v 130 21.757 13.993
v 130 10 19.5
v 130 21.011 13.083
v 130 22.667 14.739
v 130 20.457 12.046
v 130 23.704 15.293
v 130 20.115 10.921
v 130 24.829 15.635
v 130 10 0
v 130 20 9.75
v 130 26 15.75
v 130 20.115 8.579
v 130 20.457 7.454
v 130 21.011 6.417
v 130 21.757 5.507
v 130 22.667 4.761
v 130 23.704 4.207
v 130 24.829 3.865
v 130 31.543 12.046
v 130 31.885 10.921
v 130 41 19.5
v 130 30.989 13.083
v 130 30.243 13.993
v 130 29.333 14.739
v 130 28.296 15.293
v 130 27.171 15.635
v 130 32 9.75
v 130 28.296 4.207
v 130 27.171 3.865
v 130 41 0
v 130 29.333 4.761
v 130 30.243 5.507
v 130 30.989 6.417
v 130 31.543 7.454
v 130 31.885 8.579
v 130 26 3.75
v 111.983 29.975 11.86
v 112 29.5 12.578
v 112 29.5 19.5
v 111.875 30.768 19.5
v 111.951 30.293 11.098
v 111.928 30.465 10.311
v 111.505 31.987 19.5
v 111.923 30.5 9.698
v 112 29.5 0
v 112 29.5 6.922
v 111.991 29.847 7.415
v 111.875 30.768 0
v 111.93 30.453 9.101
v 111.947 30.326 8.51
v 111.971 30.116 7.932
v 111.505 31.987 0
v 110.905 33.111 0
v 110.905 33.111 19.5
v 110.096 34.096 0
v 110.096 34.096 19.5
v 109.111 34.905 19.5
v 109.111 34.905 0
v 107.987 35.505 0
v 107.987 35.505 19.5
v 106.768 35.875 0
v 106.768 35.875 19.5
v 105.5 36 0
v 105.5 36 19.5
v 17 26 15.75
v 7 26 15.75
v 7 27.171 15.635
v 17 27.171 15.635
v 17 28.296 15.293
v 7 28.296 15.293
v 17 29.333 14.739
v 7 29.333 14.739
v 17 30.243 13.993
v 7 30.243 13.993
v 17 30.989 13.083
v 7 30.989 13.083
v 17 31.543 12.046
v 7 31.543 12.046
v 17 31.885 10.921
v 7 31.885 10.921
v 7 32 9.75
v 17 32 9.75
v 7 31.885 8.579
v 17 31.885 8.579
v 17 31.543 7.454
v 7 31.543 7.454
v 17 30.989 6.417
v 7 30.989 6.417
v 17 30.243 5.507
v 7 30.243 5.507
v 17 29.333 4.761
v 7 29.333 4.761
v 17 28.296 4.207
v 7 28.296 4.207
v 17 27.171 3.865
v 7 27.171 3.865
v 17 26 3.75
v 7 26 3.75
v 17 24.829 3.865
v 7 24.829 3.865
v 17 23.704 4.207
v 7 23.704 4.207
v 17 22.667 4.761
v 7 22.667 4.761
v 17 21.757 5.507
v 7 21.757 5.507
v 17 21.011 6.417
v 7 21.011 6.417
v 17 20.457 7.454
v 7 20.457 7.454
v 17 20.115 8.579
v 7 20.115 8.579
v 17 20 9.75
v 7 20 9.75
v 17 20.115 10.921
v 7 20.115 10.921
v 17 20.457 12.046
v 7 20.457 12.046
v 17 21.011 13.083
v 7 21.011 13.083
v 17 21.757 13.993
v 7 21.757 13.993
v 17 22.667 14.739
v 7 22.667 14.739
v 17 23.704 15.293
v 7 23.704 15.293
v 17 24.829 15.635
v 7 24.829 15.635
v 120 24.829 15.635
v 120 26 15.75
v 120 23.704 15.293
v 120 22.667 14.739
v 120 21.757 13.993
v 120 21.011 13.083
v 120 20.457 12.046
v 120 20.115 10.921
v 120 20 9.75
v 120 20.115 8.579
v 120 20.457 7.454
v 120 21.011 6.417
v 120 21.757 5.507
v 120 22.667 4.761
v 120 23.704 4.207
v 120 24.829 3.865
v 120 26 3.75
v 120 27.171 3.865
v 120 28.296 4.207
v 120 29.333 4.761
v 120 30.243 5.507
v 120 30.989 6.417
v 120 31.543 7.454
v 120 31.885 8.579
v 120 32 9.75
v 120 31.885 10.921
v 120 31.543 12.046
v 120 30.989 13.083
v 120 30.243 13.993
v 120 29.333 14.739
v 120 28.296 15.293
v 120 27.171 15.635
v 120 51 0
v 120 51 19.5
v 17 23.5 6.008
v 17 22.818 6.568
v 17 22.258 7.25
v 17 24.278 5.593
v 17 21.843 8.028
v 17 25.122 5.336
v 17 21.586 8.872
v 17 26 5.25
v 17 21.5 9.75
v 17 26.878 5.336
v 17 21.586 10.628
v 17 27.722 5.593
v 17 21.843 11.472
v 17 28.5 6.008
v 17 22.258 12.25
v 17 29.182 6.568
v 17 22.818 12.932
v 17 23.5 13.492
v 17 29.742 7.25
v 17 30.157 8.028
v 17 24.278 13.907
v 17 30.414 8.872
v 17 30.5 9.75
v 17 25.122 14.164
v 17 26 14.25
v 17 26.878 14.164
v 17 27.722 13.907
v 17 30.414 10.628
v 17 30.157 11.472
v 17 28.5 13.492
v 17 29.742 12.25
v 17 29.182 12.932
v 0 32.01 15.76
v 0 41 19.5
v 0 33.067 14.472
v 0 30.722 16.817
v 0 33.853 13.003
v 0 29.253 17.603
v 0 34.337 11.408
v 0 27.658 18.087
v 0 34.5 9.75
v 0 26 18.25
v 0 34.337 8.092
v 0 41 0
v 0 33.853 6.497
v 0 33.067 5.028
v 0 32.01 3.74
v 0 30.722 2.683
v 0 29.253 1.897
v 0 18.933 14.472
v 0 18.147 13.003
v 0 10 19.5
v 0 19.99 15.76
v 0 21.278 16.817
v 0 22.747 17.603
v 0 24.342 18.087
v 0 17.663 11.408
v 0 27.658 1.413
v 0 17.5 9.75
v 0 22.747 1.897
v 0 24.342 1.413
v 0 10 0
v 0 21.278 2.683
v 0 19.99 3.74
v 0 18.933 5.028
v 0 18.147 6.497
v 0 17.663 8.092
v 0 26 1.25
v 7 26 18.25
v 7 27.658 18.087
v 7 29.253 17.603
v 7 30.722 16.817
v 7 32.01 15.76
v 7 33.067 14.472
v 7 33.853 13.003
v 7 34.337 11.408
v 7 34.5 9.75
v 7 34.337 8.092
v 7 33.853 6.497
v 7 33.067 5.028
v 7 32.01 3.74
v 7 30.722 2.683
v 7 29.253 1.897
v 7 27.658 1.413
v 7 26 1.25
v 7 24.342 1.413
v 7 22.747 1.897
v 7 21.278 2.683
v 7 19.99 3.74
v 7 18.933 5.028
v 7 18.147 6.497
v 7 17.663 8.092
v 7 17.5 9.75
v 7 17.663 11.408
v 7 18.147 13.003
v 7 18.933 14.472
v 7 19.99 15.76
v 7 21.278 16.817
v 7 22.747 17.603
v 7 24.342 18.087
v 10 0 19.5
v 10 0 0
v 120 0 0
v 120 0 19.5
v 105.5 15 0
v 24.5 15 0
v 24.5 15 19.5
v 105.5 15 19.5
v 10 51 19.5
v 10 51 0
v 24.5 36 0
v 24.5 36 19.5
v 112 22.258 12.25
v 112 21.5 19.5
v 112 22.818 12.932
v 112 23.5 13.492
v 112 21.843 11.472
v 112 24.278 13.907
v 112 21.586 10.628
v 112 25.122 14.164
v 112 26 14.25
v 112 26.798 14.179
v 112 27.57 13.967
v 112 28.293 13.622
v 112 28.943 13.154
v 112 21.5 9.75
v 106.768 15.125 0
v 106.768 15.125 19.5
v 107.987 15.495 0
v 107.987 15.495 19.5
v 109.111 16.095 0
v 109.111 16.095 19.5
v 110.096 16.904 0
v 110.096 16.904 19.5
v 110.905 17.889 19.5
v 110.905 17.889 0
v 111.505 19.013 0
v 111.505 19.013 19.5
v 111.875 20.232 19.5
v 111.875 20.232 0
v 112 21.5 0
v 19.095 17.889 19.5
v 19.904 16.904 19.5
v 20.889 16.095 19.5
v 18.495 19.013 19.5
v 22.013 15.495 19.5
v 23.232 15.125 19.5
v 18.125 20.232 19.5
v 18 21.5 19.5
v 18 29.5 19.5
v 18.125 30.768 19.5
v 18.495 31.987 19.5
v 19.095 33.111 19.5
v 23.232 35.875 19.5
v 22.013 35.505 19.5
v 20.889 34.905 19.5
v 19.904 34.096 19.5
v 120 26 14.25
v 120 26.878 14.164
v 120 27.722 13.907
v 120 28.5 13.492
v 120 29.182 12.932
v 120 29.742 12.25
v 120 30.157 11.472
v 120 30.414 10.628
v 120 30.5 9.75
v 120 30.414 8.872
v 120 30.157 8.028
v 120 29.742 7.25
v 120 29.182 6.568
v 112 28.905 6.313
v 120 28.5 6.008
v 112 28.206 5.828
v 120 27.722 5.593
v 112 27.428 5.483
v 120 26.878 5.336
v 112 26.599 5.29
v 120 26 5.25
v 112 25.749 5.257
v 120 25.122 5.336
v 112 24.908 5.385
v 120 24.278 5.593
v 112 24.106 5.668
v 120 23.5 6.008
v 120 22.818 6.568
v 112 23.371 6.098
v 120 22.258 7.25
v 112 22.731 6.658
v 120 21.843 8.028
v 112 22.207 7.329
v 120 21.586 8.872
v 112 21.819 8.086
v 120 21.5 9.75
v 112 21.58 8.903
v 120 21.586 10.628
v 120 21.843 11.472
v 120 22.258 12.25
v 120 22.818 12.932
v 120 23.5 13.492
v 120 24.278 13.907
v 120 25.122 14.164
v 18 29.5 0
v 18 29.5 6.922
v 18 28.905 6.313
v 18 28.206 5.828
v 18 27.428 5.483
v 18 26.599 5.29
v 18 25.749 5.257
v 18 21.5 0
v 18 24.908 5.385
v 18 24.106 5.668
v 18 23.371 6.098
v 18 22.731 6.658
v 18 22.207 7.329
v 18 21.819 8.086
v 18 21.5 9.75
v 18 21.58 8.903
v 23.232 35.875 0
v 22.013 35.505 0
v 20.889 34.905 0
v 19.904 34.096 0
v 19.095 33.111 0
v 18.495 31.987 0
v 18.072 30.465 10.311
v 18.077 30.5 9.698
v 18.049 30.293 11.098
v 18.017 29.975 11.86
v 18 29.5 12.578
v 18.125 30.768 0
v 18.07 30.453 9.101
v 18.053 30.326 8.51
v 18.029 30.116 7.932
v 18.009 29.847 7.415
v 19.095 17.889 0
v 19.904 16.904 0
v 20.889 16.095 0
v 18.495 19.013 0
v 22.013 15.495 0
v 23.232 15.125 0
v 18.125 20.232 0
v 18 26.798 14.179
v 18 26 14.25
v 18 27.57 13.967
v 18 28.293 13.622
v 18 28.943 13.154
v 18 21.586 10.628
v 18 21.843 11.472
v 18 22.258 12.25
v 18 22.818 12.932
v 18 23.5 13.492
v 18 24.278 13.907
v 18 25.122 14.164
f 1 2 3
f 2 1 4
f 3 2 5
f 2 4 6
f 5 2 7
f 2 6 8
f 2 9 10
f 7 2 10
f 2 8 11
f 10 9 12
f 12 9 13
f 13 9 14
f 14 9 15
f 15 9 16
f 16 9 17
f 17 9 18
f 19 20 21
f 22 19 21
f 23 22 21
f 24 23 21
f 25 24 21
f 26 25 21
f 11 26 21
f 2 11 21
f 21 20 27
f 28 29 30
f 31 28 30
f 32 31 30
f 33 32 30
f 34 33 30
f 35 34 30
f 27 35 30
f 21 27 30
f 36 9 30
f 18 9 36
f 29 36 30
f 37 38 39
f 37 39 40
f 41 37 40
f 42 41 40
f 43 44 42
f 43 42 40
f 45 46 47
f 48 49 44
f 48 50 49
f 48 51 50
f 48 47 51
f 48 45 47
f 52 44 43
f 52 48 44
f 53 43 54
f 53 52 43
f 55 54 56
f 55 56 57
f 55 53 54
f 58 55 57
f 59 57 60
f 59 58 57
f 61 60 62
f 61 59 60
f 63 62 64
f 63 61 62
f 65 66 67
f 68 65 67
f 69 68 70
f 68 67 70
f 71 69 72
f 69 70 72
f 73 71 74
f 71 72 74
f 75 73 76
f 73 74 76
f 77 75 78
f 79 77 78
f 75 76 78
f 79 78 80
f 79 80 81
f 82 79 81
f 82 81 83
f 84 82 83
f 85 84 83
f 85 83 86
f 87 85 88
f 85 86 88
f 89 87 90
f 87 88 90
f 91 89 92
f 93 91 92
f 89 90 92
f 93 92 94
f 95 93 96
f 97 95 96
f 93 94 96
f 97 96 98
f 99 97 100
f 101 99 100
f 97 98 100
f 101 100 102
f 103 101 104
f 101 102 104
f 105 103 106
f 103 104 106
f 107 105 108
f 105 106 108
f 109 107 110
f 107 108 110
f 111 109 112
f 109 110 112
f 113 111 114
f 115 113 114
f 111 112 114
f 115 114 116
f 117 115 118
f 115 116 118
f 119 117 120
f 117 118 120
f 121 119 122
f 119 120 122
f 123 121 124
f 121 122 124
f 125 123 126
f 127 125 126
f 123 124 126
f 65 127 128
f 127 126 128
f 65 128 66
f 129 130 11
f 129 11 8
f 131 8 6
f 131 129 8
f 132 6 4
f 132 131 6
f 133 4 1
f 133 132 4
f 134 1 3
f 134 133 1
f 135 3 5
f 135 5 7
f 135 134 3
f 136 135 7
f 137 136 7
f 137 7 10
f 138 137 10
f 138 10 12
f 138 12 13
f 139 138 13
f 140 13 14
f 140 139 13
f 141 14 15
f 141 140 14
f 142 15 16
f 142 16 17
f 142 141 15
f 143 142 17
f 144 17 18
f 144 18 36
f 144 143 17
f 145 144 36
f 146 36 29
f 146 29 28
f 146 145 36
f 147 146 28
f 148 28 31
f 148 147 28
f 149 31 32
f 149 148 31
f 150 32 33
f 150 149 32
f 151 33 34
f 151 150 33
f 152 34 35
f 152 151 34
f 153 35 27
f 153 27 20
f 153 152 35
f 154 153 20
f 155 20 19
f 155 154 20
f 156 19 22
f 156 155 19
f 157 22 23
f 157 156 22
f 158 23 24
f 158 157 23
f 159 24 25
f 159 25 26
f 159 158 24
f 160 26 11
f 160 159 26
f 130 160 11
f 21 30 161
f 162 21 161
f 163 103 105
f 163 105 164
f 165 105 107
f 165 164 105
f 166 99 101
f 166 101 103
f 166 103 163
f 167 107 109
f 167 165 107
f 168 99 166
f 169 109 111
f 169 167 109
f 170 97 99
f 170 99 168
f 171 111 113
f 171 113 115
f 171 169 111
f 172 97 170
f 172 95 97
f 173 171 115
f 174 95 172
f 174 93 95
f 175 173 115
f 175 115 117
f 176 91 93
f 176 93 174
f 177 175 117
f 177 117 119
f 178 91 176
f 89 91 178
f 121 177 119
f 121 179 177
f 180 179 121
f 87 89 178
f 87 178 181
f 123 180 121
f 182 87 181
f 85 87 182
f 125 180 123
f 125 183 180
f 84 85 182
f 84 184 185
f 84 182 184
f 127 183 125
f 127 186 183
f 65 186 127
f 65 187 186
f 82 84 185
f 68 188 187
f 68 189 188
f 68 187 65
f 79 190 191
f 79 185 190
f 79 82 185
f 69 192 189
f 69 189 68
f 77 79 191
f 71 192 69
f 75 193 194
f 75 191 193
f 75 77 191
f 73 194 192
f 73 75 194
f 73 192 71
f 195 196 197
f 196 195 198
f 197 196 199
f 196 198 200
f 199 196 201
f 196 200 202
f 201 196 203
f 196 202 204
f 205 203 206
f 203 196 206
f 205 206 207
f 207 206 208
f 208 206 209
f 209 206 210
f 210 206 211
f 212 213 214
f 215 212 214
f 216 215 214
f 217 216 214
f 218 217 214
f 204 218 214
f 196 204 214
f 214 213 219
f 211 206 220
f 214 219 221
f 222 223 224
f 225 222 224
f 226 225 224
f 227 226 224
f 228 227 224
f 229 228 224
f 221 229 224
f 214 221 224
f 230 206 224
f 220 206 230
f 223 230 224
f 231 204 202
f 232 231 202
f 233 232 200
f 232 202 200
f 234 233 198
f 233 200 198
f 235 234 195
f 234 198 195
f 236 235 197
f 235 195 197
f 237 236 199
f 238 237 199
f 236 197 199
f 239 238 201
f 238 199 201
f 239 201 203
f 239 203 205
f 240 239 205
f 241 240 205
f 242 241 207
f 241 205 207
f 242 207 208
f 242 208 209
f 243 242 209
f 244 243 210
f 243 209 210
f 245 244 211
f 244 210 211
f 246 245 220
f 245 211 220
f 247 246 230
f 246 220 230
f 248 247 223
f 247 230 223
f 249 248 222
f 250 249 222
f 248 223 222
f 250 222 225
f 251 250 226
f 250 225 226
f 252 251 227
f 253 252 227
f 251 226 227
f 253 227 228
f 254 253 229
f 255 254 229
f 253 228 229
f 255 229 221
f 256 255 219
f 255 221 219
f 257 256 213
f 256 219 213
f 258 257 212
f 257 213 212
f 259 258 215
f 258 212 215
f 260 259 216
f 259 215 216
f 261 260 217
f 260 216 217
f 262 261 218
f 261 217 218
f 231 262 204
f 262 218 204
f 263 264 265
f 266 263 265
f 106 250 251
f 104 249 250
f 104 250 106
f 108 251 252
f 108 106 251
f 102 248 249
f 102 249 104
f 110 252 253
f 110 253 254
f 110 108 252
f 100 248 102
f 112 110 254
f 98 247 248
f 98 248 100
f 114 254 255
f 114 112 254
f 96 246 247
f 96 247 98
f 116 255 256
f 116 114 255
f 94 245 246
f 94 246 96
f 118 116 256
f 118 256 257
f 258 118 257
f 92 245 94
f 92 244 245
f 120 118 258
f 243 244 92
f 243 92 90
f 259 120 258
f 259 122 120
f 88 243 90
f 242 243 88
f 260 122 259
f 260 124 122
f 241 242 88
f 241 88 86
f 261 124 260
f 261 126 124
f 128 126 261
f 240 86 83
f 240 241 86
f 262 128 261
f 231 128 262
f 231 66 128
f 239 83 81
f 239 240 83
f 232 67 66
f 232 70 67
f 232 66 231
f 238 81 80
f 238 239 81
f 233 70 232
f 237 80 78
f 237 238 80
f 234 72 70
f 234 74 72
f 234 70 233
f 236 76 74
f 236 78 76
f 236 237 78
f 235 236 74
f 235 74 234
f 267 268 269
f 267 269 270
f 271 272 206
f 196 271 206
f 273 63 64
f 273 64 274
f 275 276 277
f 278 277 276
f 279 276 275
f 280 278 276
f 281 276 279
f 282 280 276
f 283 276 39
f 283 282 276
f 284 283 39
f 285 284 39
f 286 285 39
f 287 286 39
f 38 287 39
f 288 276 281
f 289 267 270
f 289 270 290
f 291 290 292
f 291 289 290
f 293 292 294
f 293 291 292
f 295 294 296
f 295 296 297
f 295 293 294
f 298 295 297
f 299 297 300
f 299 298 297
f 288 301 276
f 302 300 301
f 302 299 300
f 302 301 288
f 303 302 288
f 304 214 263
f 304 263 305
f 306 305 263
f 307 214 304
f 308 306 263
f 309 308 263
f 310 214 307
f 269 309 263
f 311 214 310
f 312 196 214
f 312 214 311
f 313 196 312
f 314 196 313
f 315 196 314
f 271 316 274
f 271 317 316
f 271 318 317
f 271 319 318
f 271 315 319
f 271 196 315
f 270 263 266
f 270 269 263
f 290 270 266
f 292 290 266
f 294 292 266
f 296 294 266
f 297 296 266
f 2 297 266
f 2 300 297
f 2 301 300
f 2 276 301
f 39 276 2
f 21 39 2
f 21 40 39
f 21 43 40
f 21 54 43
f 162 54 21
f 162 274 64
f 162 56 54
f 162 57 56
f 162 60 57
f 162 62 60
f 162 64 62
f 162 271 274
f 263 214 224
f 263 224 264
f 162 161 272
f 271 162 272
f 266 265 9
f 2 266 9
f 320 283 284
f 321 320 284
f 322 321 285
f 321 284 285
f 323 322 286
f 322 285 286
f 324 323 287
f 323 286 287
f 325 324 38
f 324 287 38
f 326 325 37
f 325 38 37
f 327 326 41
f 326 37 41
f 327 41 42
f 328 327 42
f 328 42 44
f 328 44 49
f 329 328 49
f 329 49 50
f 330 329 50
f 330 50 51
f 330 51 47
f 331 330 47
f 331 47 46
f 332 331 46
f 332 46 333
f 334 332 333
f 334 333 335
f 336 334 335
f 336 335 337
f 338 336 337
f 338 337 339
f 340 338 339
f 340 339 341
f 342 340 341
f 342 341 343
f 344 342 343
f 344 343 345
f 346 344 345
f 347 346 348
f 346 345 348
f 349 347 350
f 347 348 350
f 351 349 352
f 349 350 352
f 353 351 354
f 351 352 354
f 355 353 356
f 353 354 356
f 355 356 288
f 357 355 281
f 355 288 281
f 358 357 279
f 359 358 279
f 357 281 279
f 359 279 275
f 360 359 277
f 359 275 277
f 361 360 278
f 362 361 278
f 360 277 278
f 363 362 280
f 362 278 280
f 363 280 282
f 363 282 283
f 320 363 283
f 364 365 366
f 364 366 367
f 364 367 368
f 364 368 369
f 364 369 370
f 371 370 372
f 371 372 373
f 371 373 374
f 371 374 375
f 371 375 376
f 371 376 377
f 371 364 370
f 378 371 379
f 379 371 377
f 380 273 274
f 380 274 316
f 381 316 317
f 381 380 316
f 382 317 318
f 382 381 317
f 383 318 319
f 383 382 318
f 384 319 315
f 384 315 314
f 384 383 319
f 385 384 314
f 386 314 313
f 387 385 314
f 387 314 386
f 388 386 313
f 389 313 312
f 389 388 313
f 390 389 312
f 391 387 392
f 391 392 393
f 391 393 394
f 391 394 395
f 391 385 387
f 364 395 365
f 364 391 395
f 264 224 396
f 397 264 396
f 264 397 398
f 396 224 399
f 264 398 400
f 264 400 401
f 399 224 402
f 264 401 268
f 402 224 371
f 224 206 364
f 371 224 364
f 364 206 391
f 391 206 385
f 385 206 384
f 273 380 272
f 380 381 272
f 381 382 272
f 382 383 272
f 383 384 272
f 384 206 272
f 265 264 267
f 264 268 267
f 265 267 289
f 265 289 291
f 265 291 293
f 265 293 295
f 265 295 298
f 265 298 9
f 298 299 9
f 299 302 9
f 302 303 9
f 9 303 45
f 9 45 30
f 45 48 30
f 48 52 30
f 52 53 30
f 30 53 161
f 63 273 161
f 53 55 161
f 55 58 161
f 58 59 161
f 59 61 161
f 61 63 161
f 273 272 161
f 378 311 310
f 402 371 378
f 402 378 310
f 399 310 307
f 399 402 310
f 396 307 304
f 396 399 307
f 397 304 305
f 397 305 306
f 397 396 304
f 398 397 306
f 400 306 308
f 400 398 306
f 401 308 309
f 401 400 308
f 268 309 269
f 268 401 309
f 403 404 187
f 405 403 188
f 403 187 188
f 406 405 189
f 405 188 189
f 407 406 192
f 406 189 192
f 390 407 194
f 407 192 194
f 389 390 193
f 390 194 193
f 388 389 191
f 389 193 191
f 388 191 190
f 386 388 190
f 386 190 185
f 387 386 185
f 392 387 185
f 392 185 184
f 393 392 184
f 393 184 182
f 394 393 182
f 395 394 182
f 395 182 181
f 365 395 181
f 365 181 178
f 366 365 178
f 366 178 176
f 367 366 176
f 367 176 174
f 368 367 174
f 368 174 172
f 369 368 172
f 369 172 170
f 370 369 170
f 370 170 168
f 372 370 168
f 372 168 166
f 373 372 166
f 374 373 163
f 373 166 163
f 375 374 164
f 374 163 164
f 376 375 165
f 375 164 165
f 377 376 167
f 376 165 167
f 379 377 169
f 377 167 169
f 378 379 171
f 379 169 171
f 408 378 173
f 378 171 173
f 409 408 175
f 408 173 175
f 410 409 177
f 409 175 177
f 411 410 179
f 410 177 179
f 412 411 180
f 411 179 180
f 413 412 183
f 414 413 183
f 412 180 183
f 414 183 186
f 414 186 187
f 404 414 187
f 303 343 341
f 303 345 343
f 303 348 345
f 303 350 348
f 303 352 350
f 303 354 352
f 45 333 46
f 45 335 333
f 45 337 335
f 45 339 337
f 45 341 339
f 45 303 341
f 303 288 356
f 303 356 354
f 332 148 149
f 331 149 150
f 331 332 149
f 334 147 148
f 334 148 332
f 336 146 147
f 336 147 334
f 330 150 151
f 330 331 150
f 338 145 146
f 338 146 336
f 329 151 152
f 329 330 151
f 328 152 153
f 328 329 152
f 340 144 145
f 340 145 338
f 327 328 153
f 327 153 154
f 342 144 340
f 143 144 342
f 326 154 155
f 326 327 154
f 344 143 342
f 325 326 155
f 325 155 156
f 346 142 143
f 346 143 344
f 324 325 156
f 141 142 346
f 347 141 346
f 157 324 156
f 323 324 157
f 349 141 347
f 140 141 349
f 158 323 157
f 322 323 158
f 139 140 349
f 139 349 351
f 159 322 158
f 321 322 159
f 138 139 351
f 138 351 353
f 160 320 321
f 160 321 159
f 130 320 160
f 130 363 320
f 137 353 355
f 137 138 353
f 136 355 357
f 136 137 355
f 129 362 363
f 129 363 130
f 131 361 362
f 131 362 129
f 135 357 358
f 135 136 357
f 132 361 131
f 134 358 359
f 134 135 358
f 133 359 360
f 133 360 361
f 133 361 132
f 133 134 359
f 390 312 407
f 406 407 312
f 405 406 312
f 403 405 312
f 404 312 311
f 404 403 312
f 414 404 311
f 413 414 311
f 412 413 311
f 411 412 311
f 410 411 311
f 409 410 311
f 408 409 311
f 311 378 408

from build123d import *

# Parameters (mm, degrees)
BOSS_EXTRUDE1_DEPTH = 19.5
SKETCH2_R           = 8.5
CUT_EXTRUDE2_DEPTH  = 7
SKETCH3_R           = 4.5
CUT_EXTRUDE3_DEPTH  = 142.000886522
SKETCH5_R           = 6
CUT_EXTRUDE4_DEPTH  = 10
CUT_EXTRUDE5_START  = -10
SKETCH6_R           = 6
CUT_EXTRUDE5_DEPTH  = 10


with BuildPart() as part:
    # Model → Boss-Extrude1 (new body)
    with BuildSketch(Plane.XY):
        Polygon((0, 41), (0, 10), (10, 0), (120, 0), (130, 10), (130, 41), (120, 51), (10, 51), align=None)
        with BuildLine():
            Line((24.5, 15), (105.5, 15))
            ThreePointArc((105.5, 15), (110.096194078, 16.903805922), (112, 21.5))
            Line((112, 21.5), (112, 29.5))
            ThreePointArc((112, 29.5), (110.096194078, 34.096194078), (105.5, 36))
            Line((105.5, 36), (24.5, 36))
            ThreePointArc((24.5, 36), (19.903805922, 34.096194078), (18, 29.5))
            Line((18, 29.5), (18, 21.5))
            ThreePointArc((18, 21.5), (19.903805922, 16.903805922), (24.5, 15))
        make_face(mode=Mode.SUBTRACT)
    extrude(amount=BOSS_EXTRUDE1_DEPTH)

    # Sketch2 → Cut-Extrude2 (cut)
    with BuildSketch(Plane.ZY):
        with Locations((9.75, 26)):
            Circle(SKETCH2_R)
    extrude(amount=-CUT_EXTRUDE2_DEPTH, mode=Mode.SUBTRACT)

    # Sketch3 → Cut-Extrude3 (cut, through all)
    with BuildSketch(Plane.ZY):
        with Locations((9.75, 26)):
            Circle(SKETCH3_R)
    extrude(amount=-CUT_EXTRUDE3_DEPTH, mode=Mode.SUBTRACT)

    # Sketch5 → Cut-Extrude4 (cut)
    with BuildSketch(Plane.ZY.offset(-7)):
        with Locations((9.75, 26)):
            Circle(SKETCH5_R)
    extrude(amount=-CUT_EXTRUDE4_DEPTH, mode=Mode.SUBTRACT)

    # Sketch6 → Cut-Extrude5 (cut)
    with BuildSketch(Plane(origin=(130, 0, 0), x_dir=(0, 0, -1), z_dir=(1, 0, 0)).offset(CUT_EXTRUDE5_START)):
        with Locations(Location((-9.75, 26, 0), (0, 0, 180))):
            Circle(SKETCH6_R)
    extrude(amount=CUT_EXTRUDE5_DEPTH, mode=Mode.SUBTRACT)


solid = part.part
